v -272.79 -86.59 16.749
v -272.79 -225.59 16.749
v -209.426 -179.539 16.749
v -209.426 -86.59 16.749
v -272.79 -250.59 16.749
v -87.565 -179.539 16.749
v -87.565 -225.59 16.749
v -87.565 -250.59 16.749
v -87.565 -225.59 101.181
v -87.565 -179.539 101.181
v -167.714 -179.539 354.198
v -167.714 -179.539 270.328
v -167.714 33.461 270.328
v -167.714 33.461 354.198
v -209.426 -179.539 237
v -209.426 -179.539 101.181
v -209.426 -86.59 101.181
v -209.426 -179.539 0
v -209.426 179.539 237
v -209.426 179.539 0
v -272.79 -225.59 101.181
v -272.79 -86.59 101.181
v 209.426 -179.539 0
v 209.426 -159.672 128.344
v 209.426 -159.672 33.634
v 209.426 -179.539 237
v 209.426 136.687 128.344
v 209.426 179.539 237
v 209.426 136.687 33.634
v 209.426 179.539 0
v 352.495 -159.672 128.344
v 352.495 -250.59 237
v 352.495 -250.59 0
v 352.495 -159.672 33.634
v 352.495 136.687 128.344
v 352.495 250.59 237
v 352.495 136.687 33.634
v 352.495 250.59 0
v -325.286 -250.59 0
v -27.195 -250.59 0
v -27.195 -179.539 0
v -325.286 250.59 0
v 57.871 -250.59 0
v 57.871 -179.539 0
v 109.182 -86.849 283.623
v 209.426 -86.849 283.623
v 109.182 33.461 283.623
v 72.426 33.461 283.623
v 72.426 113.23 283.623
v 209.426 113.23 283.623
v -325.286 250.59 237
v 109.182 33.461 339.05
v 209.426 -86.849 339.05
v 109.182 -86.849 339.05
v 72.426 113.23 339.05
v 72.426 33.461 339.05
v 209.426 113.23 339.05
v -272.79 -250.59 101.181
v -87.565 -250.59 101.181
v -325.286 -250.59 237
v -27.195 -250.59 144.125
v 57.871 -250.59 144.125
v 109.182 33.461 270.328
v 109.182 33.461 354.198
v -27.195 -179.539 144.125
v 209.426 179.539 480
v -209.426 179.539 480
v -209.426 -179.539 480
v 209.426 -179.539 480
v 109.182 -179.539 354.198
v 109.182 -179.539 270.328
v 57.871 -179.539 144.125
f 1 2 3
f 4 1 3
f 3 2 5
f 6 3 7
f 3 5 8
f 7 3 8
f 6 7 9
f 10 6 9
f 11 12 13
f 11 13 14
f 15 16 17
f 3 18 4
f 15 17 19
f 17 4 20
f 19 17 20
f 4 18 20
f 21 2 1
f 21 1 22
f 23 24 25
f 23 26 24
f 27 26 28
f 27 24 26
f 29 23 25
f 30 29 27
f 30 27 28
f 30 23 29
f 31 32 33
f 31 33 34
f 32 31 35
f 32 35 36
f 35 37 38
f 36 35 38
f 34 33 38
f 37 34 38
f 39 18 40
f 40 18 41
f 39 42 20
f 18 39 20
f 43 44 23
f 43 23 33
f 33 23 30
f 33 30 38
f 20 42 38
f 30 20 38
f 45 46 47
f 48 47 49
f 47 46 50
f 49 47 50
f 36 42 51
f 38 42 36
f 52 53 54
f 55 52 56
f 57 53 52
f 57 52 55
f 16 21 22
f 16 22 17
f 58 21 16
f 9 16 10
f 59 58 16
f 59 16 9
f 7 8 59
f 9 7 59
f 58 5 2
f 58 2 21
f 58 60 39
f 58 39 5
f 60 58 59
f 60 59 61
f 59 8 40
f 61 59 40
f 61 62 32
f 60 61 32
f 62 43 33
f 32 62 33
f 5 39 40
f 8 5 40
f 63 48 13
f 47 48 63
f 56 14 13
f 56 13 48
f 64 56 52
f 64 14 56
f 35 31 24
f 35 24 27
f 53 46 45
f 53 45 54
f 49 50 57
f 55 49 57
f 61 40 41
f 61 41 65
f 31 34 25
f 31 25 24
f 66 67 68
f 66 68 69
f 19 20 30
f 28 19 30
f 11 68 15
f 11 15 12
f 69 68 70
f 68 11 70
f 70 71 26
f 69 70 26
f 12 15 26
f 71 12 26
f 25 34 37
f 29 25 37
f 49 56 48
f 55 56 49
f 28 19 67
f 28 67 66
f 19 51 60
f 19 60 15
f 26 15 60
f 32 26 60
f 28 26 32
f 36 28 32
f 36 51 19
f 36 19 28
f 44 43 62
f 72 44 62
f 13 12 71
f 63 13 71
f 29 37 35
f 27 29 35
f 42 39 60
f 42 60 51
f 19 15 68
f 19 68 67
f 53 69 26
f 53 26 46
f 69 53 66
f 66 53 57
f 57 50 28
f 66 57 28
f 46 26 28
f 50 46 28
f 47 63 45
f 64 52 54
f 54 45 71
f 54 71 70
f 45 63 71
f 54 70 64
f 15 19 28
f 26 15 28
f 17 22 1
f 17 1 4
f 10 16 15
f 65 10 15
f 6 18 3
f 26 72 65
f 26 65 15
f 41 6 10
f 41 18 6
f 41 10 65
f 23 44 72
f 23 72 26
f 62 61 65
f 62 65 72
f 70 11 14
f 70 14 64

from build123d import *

# Parameters (mm, degrees)
F0_W      = 677.780265
F0_H      = 501.180768
F0_W_2    = 418.851674
F0_H_2    = 359.078794
F1_DEPTH  = 237
F2_W      = 85.066182
F2_H      = 144.125044
F3_DEPTH  = 154
F2_W_2    = 185.224779
F2_H_2    = 84.431998
F4_DEPTH  = 25
F5_W      = 296.359644
F5_H      = 94.710044
F6_DEPTH  = 381
F4_FACE_W = 185.224778
F4_FACE_H = 84.431998
F7_DEPTH  = 139
F8_W      = 418.851674
F8_H      = 359.078794
F9_DEPTH  = 243
F10_W     = 276.896224
F10_H     = 83.870173
F11_DEPTH = 213
F12_W     = 200.079829
F12_H     = 55.427224
F13_DEPTH = 137


with BuildPart() as f1:
    # F0 (on Top) → F1 (new body)
    with BuildSketch(Plane.XY):
        with Locations((13.604429, 0)):
            Rectangle(F0_W, F0_H)
        Rectangle(F0_W_2, F0_H_2, mode=Mode.SUBTRACT)
    extrude(amount=F1_DEPTH)

    # F2 (on face) → F3 (cut)
    with BuildSketch(Plane.XZ.offset(250.590384)):
        with Locations((15.337744, 72.062522)):
            Rectangle(F2_W, F2_H)
    extrude(amount=-F3_DEPTH, mode=Mode.SUBTRACT)

    # F2 (on face) → F4 (cut)
    with BuildSketch(Plane.XZ.offset(250.590384)):
        with Locations((15.337744, 72.062522)):
            Rectangle(F2_W, F2_H)
        with Locations((-180.177298, 58.965165)):
            Rectangle(F2_W_2, F2_H_2)
    extrude(amount=-F4_DEPTH, mode=Mode.SUBTRACT)

    # F5 (on face) → F6 (cut)
    with BuildSketch(Plane.YZ.offset(352.494562)):
        with Locations((-11.492379, 80.989275)):
            Rectangle(F5_W, F5_H)
    extrude(amount=-F6_DEPTH, mode=Mode.SUBTRACT)

    # F4_face (on face) → F7 (cut)
    with BuildSketch(Plane(origin=(-180.177297, -225.590384, 58.965165), x_dir=(1, 0, 0), z_dir=(0, -1, 0))):
        Rectangle(F4_FACE_W, F4_FACE_H)
    extrude(amount=-F7_DEPTH, mode=Mode.SUBTRACT)


with BuildPart() as f9:
    # F8 (on face) → F9 (new body)
    with BuildSketch(Plane.XY.offset(237)):
        Rectangle(F8_W, F8_H)
    extrude(amount=F9_DEPTH)

    # F10 (on face) → F11 (cut)
    with BuildSketch(Plane.XZ.offset(179.539397)):
        with Locations((-29.266335, 312.263369)):
            Rectangle(F10_W, F10_H)
    extrude(amount=-F11_DEPTH, mode=Mode.SUBTRACT)

    # F12 (on face) → F13 (cut)
    with BuildSketch(Plane.YZ.offset(209.425837)):
        with Locations((13.190552, 311.336115)):
            Rectangle(F12_W, F12_H)
    extrude(amount=-F13_DEPTH, mode=Mode.SUBTRACT)


solid = Compound([f1.part, f9.part])
